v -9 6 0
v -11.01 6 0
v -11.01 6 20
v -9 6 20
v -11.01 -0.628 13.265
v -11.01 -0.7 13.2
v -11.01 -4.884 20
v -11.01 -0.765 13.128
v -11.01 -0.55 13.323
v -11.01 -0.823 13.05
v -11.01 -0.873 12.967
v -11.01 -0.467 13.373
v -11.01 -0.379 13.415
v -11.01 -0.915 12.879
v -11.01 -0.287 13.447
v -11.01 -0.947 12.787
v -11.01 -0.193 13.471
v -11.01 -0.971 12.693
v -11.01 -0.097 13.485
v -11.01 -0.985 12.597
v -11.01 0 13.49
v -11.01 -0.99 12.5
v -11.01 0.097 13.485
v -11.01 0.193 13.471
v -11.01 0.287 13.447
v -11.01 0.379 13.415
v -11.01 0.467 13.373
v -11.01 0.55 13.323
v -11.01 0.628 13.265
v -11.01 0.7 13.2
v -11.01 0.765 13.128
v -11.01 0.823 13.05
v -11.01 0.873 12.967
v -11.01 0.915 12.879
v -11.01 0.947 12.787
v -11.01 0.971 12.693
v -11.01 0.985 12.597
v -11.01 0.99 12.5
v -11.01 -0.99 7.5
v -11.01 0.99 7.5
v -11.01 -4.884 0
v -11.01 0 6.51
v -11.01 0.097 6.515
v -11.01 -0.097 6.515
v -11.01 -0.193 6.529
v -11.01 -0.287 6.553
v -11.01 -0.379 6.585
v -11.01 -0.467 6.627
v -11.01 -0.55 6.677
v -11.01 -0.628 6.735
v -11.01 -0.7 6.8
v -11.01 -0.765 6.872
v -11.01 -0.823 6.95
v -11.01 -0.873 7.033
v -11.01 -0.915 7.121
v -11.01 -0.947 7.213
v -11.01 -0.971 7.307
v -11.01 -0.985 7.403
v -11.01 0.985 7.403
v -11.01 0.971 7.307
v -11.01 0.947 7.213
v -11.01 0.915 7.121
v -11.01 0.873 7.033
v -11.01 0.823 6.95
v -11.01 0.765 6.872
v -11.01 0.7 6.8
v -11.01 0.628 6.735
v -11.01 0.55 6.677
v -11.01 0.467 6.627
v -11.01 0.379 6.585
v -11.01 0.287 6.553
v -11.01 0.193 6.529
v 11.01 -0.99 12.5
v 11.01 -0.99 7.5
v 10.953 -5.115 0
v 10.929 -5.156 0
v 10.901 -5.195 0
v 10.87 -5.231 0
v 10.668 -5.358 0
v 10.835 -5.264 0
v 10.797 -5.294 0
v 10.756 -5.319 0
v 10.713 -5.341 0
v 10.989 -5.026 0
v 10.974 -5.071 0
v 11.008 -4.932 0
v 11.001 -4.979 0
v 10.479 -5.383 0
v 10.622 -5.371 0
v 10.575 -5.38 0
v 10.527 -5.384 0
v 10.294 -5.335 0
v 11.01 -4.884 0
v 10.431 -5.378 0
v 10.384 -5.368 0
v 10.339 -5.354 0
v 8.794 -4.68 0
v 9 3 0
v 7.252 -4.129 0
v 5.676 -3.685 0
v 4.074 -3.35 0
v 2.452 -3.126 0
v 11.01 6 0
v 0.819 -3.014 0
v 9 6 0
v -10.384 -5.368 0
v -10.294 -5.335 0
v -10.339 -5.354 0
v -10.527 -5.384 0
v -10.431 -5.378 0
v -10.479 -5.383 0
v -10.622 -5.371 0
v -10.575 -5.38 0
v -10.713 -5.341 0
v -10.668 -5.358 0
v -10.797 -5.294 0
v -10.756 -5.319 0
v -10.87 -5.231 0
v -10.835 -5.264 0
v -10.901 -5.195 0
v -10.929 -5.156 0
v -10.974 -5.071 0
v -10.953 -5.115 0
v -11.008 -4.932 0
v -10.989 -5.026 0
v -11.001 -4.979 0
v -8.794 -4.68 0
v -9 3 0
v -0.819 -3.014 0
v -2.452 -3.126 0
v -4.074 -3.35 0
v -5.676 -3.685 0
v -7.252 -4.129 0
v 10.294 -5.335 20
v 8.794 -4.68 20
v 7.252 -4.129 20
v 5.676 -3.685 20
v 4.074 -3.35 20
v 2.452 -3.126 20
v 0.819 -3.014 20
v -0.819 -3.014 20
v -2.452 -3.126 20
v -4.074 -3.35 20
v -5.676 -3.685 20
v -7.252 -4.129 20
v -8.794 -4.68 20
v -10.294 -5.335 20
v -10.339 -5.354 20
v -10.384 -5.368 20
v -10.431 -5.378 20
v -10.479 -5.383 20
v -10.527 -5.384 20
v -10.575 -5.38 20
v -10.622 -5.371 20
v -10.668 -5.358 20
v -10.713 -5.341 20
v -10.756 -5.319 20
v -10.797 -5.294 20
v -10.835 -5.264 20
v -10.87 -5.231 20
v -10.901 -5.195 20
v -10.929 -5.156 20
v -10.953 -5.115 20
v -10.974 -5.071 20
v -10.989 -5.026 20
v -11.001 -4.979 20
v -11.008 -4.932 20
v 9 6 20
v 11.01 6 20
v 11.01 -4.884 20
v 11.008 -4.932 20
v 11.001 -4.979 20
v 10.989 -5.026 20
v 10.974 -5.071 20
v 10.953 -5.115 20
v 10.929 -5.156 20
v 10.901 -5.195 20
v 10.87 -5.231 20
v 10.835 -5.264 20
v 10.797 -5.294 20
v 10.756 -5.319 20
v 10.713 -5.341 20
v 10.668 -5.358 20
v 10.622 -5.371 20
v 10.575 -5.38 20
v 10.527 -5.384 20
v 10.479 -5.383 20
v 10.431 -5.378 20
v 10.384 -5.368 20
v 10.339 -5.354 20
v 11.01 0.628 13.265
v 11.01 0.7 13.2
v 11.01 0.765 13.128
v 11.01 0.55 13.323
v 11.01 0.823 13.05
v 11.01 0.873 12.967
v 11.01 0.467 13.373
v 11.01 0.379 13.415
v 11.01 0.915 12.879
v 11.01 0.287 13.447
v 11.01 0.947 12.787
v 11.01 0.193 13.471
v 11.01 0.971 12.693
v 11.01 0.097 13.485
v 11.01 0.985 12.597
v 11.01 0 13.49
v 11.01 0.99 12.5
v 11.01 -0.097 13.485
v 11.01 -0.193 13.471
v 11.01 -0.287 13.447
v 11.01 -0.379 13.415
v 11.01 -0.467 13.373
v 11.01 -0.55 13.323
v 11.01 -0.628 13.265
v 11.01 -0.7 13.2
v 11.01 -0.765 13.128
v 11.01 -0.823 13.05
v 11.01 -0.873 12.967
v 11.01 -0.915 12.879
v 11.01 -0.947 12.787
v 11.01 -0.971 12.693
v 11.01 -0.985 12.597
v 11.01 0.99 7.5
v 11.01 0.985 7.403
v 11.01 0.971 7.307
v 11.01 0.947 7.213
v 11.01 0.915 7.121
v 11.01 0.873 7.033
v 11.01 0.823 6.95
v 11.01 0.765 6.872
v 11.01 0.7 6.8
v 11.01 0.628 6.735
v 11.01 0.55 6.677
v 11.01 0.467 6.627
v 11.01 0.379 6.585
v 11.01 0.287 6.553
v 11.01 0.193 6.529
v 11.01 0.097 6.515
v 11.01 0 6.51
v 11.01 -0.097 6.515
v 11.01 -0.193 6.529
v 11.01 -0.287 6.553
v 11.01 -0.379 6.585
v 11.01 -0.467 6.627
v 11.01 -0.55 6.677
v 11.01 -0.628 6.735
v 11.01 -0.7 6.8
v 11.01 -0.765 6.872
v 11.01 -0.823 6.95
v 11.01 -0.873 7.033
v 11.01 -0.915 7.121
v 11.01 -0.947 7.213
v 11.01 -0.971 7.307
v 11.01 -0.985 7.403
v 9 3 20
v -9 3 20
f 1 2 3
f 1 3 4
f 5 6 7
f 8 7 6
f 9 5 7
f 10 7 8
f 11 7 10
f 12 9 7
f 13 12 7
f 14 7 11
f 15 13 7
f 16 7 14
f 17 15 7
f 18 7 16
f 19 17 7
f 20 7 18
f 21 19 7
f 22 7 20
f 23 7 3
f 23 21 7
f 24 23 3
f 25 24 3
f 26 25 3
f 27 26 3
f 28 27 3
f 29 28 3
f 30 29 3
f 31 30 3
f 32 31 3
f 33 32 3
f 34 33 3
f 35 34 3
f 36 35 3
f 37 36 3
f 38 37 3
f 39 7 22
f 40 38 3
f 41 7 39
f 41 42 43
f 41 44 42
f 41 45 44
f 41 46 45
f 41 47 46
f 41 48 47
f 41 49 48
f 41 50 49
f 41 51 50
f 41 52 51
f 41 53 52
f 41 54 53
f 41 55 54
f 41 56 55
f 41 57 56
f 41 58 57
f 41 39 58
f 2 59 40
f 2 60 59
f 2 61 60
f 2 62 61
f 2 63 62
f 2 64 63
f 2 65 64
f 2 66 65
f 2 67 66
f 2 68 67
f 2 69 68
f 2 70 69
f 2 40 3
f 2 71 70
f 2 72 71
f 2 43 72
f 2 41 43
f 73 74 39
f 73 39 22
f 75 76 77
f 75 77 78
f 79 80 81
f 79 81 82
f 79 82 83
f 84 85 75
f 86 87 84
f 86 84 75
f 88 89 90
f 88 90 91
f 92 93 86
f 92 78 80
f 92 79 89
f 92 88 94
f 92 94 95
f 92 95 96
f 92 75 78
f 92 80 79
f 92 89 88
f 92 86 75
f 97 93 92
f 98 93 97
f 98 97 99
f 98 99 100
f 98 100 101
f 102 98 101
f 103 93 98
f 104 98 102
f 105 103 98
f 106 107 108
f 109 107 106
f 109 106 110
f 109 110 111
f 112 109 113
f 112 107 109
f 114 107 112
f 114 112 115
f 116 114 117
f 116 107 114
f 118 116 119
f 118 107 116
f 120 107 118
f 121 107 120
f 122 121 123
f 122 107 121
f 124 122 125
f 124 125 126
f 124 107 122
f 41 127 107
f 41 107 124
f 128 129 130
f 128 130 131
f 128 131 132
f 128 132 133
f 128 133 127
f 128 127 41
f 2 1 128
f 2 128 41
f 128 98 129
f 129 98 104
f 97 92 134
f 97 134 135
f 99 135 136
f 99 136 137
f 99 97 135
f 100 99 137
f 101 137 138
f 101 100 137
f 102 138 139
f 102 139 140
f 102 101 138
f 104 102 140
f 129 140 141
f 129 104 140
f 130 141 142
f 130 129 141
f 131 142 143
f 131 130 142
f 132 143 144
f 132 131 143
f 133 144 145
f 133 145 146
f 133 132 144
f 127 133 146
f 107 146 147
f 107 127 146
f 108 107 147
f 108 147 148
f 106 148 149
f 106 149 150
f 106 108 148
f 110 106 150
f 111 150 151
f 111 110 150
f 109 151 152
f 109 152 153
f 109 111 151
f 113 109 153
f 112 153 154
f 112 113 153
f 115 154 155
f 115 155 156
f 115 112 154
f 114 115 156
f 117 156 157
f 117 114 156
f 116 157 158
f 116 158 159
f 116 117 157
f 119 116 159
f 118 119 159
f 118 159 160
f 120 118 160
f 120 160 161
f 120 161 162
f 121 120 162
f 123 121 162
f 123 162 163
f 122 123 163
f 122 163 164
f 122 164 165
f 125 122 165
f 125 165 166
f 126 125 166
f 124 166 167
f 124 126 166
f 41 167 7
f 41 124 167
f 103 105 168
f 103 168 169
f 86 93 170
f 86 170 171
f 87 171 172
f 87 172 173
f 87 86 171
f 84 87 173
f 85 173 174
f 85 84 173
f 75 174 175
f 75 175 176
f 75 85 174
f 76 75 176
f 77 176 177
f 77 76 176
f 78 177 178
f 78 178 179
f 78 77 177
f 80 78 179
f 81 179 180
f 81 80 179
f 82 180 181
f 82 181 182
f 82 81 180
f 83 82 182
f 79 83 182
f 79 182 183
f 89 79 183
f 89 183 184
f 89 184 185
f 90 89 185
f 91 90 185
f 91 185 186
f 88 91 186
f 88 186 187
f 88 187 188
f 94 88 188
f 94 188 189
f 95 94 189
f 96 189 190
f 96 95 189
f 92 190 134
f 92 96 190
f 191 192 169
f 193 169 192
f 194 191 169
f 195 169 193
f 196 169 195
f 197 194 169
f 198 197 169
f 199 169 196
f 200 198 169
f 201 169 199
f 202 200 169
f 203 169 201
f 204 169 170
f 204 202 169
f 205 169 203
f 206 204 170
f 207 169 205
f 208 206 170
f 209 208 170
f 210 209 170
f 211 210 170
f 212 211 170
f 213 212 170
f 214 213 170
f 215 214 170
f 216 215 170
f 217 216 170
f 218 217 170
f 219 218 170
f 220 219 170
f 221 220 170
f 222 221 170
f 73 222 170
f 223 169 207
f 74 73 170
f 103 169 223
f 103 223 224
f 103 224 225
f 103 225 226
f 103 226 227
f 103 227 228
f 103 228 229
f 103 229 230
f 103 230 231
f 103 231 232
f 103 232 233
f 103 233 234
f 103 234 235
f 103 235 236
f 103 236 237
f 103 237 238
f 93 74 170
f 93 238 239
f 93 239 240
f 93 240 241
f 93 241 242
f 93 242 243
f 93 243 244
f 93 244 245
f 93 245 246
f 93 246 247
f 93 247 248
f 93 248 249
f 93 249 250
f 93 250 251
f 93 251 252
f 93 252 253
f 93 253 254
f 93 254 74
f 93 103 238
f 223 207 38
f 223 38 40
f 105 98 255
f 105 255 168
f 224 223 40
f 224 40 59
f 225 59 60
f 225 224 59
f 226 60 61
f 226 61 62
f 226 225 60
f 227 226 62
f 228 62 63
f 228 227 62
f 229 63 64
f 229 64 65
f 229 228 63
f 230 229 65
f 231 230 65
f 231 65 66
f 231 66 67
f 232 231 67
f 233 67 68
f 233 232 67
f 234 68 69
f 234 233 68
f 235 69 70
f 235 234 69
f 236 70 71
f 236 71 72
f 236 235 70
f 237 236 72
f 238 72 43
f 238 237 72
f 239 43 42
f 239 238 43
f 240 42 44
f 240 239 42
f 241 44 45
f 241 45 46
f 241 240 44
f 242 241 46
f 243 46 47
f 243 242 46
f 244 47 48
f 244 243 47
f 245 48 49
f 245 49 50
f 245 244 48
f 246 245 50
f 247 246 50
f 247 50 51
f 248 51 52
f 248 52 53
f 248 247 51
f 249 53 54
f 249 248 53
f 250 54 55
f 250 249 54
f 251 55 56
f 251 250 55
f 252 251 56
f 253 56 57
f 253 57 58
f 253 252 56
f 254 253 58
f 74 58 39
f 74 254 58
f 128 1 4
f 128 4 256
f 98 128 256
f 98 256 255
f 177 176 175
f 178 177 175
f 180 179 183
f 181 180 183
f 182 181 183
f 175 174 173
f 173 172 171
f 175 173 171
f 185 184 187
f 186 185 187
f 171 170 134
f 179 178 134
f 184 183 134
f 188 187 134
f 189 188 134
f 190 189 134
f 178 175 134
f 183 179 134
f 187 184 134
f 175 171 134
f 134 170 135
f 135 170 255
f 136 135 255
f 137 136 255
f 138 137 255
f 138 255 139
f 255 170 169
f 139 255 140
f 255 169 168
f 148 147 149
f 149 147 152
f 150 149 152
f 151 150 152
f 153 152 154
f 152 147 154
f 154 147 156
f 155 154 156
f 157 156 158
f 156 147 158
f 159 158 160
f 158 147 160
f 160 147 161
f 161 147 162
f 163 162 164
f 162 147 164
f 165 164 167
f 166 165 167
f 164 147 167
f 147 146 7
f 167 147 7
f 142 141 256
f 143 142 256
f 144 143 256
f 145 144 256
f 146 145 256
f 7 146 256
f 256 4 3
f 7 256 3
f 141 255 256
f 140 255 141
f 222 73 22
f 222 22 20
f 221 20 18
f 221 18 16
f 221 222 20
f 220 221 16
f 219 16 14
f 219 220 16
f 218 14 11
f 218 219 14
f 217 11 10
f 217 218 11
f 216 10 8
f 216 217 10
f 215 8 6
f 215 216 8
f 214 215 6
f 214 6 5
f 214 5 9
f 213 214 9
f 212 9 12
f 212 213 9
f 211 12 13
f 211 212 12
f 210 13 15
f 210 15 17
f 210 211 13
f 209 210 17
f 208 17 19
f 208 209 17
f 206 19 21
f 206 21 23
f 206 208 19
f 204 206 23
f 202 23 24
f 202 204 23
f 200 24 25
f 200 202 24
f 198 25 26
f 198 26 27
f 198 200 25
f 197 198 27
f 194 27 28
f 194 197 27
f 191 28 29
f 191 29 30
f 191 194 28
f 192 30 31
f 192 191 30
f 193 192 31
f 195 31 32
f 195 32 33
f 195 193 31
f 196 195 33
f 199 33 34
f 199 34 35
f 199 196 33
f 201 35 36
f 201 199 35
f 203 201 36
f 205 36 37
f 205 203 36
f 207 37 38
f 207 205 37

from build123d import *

# Parameters (mm, degrees)
BOSS_EXTRUDE1_DEPTH = 20
CUT_EXTRUDE1_DEPTH  = 22.02


with BuildPart() as part:
    # Sketch1 → Boss-Extrude1 (new body)
    with BuildSketch(Plane.XY):
        with BuildLine():
            Line((-9, 3), (9, 3))
            Line((9, 3), (9, 6))
            Line((9, 6), (11.01, 6))
            Line((11.01, 6), (11.01, -4.883887969))
            ThreePointArc((11.01, -4.883887969), (10.776588402, -5.306889889), (10.294277504, -5.334957592))
            ThreePointArc((10.294277504, -5.334957592), (0, -3), (-10.294277504, -5.334957592))
            ThreePointArc((-10.294277504, -5.334957592), (-10.776588402, -5.306889889), (-11.01, -4.883887969))
            Line((-11.01, -4.883887969), (-11.01, 6))
            Line((-11.01, 6), (-9, 6))
            Line((-9, 6), (-9, 3))
        make_face()
    extrude(amount=BOSS_EXTRUDE1_DEPTH)

    # Sketch2 → Cut-Extrude1 (cut)
    with BuildSketch(Plane(origin=(11.01, 0, 0), x_dir=(0, 0, -1), z_dir=(1, 0, 0))):
        with BuildLine():
            Line((-12.5, 0.99), (-7.5, 0.99))
            ThreePointArc((-7.5, 0.99), (-6.51, 0), (-7.5, -0.99))
            Line((-7.5, -0.99), (-12.5, -0.99))
            ThreePointArc((-12.5, -0.99), (-13.49, 0), (-12.5, 0.99))
        make_face()
    extrude(amount=-CUT_EXTRUDE1_DEPTH, mode=Mode.SUBTRACT)


solid = part.part
